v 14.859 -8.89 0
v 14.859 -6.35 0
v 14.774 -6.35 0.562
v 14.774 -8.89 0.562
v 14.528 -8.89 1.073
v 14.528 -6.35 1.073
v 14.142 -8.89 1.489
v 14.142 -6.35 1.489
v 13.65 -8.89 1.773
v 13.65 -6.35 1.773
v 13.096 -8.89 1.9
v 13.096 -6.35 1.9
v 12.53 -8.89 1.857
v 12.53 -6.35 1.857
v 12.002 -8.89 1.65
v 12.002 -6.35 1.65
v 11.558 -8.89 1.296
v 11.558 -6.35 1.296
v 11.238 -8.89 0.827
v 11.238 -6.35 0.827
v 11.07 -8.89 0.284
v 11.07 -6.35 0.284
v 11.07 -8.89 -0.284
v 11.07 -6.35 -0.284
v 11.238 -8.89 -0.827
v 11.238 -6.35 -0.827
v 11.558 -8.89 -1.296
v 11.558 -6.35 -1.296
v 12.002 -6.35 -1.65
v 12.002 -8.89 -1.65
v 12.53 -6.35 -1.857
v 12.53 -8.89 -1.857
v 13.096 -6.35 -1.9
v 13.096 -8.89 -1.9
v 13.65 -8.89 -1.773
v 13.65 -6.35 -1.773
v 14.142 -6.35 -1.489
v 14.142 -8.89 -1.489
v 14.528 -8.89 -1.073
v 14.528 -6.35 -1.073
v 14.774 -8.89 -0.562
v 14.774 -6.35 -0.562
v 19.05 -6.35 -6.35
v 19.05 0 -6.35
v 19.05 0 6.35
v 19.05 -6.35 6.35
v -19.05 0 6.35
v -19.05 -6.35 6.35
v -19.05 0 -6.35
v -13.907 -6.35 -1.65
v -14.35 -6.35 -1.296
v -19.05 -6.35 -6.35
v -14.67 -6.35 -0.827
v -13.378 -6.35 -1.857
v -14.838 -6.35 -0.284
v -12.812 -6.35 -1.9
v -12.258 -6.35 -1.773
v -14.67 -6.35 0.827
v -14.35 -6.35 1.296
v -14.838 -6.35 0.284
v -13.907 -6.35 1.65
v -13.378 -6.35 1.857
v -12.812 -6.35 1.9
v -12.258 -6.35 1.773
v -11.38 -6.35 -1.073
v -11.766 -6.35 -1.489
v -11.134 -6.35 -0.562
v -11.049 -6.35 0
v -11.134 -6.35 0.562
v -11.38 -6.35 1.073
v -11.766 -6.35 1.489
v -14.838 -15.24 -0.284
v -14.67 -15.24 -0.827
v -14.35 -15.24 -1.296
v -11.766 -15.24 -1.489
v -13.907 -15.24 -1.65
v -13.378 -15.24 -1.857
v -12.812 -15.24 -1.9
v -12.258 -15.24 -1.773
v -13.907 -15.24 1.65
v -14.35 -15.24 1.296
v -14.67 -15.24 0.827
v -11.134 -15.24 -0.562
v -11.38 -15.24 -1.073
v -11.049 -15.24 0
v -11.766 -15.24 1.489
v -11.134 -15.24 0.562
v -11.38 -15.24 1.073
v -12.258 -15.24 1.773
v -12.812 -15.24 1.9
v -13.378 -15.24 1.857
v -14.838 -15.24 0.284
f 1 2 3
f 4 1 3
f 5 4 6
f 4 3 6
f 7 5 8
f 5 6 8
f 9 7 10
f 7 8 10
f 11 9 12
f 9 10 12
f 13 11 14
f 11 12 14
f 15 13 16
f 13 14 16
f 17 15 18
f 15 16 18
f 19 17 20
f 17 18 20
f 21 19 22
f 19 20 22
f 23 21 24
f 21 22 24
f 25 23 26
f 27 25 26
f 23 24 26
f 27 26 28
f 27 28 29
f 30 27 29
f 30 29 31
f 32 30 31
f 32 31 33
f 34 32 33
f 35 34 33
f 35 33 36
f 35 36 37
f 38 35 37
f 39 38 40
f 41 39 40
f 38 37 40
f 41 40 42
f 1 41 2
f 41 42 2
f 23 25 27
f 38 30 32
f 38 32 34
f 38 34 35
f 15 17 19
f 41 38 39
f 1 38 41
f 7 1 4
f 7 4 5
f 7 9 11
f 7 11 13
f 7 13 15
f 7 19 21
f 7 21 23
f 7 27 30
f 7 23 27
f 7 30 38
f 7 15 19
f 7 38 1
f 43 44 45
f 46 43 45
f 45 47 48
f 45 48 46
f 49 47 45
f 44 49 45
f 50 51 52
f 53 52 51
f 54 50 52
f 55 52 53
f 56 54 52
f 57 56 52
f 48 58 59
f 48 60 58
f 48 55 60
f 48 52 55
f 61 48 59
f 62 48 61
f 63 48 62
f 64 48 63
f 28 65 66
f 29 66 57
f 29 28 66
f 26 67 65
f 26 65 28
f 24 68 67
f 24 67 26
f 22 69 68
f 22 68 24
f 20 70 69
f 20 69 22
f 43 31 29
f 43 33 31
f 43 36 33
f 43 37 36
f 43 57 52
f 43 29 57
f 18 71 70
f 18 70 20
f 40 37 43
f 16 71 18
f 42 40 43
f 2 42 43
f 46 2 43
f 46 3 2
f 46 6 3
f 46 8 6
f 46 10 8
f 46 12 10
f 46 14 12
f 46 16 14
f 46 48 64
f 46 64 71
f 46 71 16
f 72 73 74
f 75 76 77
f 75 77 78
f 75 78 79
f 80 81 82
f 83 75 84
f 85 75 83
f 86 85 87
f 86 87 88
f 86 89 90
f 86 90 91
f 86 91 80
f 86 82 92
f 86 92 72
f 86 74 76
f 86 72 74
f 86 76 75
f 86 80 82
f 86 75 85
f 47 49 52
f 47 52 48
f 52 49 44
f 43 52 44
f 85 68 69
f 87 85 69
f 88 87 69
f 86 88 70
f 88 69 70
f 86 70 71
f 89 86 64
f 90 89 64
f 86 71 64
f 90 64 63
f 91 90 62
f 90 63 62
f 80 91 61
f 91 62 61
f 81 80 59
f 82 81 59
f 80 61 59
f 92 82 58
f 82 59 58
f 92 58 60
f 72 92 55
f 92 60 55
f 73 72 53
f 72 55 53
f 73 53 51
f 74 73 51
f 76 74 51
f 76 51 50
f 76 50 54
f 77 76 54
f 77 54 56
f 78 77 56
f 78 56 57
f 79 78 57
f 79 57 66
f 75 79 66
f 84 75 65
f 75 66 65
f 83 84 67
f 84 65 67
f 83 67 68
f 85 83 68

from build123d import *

# Parameters (mm, degrees)
F0_W     = 38.1
F0_H     = 12.7
F1_DEPTH = 6.35
F2_R     = 1.905
F3_DEPTH = 8.89
F4_R     = 1.905
F5_DEPTH = 2.54


with BuildPart() as f1:
    # F0 (on Front) → F1 (new body)
    with BuildSketch(Plane.XZ):
        Rectangle(F0_W, F0_H)
    extrude(amount=F1_DEPTH)

    # F2 (on face) → F3 (join)
    with BuildSketch(Plane.XZ.offset(6.35)):
        with Locations((-12.954, 0)):
            Circle(F2_R)
    extrude(amount=F3_DEPTH)

    # F4 (on face) → F5 (join)
    with BuildSketch(Plane.XZ.offset(6.35)):
        with Locations((12.954, 0)):
            Circle(F4_R)
    extrude(amount=F5_DEPTH)


solid = f1.part
